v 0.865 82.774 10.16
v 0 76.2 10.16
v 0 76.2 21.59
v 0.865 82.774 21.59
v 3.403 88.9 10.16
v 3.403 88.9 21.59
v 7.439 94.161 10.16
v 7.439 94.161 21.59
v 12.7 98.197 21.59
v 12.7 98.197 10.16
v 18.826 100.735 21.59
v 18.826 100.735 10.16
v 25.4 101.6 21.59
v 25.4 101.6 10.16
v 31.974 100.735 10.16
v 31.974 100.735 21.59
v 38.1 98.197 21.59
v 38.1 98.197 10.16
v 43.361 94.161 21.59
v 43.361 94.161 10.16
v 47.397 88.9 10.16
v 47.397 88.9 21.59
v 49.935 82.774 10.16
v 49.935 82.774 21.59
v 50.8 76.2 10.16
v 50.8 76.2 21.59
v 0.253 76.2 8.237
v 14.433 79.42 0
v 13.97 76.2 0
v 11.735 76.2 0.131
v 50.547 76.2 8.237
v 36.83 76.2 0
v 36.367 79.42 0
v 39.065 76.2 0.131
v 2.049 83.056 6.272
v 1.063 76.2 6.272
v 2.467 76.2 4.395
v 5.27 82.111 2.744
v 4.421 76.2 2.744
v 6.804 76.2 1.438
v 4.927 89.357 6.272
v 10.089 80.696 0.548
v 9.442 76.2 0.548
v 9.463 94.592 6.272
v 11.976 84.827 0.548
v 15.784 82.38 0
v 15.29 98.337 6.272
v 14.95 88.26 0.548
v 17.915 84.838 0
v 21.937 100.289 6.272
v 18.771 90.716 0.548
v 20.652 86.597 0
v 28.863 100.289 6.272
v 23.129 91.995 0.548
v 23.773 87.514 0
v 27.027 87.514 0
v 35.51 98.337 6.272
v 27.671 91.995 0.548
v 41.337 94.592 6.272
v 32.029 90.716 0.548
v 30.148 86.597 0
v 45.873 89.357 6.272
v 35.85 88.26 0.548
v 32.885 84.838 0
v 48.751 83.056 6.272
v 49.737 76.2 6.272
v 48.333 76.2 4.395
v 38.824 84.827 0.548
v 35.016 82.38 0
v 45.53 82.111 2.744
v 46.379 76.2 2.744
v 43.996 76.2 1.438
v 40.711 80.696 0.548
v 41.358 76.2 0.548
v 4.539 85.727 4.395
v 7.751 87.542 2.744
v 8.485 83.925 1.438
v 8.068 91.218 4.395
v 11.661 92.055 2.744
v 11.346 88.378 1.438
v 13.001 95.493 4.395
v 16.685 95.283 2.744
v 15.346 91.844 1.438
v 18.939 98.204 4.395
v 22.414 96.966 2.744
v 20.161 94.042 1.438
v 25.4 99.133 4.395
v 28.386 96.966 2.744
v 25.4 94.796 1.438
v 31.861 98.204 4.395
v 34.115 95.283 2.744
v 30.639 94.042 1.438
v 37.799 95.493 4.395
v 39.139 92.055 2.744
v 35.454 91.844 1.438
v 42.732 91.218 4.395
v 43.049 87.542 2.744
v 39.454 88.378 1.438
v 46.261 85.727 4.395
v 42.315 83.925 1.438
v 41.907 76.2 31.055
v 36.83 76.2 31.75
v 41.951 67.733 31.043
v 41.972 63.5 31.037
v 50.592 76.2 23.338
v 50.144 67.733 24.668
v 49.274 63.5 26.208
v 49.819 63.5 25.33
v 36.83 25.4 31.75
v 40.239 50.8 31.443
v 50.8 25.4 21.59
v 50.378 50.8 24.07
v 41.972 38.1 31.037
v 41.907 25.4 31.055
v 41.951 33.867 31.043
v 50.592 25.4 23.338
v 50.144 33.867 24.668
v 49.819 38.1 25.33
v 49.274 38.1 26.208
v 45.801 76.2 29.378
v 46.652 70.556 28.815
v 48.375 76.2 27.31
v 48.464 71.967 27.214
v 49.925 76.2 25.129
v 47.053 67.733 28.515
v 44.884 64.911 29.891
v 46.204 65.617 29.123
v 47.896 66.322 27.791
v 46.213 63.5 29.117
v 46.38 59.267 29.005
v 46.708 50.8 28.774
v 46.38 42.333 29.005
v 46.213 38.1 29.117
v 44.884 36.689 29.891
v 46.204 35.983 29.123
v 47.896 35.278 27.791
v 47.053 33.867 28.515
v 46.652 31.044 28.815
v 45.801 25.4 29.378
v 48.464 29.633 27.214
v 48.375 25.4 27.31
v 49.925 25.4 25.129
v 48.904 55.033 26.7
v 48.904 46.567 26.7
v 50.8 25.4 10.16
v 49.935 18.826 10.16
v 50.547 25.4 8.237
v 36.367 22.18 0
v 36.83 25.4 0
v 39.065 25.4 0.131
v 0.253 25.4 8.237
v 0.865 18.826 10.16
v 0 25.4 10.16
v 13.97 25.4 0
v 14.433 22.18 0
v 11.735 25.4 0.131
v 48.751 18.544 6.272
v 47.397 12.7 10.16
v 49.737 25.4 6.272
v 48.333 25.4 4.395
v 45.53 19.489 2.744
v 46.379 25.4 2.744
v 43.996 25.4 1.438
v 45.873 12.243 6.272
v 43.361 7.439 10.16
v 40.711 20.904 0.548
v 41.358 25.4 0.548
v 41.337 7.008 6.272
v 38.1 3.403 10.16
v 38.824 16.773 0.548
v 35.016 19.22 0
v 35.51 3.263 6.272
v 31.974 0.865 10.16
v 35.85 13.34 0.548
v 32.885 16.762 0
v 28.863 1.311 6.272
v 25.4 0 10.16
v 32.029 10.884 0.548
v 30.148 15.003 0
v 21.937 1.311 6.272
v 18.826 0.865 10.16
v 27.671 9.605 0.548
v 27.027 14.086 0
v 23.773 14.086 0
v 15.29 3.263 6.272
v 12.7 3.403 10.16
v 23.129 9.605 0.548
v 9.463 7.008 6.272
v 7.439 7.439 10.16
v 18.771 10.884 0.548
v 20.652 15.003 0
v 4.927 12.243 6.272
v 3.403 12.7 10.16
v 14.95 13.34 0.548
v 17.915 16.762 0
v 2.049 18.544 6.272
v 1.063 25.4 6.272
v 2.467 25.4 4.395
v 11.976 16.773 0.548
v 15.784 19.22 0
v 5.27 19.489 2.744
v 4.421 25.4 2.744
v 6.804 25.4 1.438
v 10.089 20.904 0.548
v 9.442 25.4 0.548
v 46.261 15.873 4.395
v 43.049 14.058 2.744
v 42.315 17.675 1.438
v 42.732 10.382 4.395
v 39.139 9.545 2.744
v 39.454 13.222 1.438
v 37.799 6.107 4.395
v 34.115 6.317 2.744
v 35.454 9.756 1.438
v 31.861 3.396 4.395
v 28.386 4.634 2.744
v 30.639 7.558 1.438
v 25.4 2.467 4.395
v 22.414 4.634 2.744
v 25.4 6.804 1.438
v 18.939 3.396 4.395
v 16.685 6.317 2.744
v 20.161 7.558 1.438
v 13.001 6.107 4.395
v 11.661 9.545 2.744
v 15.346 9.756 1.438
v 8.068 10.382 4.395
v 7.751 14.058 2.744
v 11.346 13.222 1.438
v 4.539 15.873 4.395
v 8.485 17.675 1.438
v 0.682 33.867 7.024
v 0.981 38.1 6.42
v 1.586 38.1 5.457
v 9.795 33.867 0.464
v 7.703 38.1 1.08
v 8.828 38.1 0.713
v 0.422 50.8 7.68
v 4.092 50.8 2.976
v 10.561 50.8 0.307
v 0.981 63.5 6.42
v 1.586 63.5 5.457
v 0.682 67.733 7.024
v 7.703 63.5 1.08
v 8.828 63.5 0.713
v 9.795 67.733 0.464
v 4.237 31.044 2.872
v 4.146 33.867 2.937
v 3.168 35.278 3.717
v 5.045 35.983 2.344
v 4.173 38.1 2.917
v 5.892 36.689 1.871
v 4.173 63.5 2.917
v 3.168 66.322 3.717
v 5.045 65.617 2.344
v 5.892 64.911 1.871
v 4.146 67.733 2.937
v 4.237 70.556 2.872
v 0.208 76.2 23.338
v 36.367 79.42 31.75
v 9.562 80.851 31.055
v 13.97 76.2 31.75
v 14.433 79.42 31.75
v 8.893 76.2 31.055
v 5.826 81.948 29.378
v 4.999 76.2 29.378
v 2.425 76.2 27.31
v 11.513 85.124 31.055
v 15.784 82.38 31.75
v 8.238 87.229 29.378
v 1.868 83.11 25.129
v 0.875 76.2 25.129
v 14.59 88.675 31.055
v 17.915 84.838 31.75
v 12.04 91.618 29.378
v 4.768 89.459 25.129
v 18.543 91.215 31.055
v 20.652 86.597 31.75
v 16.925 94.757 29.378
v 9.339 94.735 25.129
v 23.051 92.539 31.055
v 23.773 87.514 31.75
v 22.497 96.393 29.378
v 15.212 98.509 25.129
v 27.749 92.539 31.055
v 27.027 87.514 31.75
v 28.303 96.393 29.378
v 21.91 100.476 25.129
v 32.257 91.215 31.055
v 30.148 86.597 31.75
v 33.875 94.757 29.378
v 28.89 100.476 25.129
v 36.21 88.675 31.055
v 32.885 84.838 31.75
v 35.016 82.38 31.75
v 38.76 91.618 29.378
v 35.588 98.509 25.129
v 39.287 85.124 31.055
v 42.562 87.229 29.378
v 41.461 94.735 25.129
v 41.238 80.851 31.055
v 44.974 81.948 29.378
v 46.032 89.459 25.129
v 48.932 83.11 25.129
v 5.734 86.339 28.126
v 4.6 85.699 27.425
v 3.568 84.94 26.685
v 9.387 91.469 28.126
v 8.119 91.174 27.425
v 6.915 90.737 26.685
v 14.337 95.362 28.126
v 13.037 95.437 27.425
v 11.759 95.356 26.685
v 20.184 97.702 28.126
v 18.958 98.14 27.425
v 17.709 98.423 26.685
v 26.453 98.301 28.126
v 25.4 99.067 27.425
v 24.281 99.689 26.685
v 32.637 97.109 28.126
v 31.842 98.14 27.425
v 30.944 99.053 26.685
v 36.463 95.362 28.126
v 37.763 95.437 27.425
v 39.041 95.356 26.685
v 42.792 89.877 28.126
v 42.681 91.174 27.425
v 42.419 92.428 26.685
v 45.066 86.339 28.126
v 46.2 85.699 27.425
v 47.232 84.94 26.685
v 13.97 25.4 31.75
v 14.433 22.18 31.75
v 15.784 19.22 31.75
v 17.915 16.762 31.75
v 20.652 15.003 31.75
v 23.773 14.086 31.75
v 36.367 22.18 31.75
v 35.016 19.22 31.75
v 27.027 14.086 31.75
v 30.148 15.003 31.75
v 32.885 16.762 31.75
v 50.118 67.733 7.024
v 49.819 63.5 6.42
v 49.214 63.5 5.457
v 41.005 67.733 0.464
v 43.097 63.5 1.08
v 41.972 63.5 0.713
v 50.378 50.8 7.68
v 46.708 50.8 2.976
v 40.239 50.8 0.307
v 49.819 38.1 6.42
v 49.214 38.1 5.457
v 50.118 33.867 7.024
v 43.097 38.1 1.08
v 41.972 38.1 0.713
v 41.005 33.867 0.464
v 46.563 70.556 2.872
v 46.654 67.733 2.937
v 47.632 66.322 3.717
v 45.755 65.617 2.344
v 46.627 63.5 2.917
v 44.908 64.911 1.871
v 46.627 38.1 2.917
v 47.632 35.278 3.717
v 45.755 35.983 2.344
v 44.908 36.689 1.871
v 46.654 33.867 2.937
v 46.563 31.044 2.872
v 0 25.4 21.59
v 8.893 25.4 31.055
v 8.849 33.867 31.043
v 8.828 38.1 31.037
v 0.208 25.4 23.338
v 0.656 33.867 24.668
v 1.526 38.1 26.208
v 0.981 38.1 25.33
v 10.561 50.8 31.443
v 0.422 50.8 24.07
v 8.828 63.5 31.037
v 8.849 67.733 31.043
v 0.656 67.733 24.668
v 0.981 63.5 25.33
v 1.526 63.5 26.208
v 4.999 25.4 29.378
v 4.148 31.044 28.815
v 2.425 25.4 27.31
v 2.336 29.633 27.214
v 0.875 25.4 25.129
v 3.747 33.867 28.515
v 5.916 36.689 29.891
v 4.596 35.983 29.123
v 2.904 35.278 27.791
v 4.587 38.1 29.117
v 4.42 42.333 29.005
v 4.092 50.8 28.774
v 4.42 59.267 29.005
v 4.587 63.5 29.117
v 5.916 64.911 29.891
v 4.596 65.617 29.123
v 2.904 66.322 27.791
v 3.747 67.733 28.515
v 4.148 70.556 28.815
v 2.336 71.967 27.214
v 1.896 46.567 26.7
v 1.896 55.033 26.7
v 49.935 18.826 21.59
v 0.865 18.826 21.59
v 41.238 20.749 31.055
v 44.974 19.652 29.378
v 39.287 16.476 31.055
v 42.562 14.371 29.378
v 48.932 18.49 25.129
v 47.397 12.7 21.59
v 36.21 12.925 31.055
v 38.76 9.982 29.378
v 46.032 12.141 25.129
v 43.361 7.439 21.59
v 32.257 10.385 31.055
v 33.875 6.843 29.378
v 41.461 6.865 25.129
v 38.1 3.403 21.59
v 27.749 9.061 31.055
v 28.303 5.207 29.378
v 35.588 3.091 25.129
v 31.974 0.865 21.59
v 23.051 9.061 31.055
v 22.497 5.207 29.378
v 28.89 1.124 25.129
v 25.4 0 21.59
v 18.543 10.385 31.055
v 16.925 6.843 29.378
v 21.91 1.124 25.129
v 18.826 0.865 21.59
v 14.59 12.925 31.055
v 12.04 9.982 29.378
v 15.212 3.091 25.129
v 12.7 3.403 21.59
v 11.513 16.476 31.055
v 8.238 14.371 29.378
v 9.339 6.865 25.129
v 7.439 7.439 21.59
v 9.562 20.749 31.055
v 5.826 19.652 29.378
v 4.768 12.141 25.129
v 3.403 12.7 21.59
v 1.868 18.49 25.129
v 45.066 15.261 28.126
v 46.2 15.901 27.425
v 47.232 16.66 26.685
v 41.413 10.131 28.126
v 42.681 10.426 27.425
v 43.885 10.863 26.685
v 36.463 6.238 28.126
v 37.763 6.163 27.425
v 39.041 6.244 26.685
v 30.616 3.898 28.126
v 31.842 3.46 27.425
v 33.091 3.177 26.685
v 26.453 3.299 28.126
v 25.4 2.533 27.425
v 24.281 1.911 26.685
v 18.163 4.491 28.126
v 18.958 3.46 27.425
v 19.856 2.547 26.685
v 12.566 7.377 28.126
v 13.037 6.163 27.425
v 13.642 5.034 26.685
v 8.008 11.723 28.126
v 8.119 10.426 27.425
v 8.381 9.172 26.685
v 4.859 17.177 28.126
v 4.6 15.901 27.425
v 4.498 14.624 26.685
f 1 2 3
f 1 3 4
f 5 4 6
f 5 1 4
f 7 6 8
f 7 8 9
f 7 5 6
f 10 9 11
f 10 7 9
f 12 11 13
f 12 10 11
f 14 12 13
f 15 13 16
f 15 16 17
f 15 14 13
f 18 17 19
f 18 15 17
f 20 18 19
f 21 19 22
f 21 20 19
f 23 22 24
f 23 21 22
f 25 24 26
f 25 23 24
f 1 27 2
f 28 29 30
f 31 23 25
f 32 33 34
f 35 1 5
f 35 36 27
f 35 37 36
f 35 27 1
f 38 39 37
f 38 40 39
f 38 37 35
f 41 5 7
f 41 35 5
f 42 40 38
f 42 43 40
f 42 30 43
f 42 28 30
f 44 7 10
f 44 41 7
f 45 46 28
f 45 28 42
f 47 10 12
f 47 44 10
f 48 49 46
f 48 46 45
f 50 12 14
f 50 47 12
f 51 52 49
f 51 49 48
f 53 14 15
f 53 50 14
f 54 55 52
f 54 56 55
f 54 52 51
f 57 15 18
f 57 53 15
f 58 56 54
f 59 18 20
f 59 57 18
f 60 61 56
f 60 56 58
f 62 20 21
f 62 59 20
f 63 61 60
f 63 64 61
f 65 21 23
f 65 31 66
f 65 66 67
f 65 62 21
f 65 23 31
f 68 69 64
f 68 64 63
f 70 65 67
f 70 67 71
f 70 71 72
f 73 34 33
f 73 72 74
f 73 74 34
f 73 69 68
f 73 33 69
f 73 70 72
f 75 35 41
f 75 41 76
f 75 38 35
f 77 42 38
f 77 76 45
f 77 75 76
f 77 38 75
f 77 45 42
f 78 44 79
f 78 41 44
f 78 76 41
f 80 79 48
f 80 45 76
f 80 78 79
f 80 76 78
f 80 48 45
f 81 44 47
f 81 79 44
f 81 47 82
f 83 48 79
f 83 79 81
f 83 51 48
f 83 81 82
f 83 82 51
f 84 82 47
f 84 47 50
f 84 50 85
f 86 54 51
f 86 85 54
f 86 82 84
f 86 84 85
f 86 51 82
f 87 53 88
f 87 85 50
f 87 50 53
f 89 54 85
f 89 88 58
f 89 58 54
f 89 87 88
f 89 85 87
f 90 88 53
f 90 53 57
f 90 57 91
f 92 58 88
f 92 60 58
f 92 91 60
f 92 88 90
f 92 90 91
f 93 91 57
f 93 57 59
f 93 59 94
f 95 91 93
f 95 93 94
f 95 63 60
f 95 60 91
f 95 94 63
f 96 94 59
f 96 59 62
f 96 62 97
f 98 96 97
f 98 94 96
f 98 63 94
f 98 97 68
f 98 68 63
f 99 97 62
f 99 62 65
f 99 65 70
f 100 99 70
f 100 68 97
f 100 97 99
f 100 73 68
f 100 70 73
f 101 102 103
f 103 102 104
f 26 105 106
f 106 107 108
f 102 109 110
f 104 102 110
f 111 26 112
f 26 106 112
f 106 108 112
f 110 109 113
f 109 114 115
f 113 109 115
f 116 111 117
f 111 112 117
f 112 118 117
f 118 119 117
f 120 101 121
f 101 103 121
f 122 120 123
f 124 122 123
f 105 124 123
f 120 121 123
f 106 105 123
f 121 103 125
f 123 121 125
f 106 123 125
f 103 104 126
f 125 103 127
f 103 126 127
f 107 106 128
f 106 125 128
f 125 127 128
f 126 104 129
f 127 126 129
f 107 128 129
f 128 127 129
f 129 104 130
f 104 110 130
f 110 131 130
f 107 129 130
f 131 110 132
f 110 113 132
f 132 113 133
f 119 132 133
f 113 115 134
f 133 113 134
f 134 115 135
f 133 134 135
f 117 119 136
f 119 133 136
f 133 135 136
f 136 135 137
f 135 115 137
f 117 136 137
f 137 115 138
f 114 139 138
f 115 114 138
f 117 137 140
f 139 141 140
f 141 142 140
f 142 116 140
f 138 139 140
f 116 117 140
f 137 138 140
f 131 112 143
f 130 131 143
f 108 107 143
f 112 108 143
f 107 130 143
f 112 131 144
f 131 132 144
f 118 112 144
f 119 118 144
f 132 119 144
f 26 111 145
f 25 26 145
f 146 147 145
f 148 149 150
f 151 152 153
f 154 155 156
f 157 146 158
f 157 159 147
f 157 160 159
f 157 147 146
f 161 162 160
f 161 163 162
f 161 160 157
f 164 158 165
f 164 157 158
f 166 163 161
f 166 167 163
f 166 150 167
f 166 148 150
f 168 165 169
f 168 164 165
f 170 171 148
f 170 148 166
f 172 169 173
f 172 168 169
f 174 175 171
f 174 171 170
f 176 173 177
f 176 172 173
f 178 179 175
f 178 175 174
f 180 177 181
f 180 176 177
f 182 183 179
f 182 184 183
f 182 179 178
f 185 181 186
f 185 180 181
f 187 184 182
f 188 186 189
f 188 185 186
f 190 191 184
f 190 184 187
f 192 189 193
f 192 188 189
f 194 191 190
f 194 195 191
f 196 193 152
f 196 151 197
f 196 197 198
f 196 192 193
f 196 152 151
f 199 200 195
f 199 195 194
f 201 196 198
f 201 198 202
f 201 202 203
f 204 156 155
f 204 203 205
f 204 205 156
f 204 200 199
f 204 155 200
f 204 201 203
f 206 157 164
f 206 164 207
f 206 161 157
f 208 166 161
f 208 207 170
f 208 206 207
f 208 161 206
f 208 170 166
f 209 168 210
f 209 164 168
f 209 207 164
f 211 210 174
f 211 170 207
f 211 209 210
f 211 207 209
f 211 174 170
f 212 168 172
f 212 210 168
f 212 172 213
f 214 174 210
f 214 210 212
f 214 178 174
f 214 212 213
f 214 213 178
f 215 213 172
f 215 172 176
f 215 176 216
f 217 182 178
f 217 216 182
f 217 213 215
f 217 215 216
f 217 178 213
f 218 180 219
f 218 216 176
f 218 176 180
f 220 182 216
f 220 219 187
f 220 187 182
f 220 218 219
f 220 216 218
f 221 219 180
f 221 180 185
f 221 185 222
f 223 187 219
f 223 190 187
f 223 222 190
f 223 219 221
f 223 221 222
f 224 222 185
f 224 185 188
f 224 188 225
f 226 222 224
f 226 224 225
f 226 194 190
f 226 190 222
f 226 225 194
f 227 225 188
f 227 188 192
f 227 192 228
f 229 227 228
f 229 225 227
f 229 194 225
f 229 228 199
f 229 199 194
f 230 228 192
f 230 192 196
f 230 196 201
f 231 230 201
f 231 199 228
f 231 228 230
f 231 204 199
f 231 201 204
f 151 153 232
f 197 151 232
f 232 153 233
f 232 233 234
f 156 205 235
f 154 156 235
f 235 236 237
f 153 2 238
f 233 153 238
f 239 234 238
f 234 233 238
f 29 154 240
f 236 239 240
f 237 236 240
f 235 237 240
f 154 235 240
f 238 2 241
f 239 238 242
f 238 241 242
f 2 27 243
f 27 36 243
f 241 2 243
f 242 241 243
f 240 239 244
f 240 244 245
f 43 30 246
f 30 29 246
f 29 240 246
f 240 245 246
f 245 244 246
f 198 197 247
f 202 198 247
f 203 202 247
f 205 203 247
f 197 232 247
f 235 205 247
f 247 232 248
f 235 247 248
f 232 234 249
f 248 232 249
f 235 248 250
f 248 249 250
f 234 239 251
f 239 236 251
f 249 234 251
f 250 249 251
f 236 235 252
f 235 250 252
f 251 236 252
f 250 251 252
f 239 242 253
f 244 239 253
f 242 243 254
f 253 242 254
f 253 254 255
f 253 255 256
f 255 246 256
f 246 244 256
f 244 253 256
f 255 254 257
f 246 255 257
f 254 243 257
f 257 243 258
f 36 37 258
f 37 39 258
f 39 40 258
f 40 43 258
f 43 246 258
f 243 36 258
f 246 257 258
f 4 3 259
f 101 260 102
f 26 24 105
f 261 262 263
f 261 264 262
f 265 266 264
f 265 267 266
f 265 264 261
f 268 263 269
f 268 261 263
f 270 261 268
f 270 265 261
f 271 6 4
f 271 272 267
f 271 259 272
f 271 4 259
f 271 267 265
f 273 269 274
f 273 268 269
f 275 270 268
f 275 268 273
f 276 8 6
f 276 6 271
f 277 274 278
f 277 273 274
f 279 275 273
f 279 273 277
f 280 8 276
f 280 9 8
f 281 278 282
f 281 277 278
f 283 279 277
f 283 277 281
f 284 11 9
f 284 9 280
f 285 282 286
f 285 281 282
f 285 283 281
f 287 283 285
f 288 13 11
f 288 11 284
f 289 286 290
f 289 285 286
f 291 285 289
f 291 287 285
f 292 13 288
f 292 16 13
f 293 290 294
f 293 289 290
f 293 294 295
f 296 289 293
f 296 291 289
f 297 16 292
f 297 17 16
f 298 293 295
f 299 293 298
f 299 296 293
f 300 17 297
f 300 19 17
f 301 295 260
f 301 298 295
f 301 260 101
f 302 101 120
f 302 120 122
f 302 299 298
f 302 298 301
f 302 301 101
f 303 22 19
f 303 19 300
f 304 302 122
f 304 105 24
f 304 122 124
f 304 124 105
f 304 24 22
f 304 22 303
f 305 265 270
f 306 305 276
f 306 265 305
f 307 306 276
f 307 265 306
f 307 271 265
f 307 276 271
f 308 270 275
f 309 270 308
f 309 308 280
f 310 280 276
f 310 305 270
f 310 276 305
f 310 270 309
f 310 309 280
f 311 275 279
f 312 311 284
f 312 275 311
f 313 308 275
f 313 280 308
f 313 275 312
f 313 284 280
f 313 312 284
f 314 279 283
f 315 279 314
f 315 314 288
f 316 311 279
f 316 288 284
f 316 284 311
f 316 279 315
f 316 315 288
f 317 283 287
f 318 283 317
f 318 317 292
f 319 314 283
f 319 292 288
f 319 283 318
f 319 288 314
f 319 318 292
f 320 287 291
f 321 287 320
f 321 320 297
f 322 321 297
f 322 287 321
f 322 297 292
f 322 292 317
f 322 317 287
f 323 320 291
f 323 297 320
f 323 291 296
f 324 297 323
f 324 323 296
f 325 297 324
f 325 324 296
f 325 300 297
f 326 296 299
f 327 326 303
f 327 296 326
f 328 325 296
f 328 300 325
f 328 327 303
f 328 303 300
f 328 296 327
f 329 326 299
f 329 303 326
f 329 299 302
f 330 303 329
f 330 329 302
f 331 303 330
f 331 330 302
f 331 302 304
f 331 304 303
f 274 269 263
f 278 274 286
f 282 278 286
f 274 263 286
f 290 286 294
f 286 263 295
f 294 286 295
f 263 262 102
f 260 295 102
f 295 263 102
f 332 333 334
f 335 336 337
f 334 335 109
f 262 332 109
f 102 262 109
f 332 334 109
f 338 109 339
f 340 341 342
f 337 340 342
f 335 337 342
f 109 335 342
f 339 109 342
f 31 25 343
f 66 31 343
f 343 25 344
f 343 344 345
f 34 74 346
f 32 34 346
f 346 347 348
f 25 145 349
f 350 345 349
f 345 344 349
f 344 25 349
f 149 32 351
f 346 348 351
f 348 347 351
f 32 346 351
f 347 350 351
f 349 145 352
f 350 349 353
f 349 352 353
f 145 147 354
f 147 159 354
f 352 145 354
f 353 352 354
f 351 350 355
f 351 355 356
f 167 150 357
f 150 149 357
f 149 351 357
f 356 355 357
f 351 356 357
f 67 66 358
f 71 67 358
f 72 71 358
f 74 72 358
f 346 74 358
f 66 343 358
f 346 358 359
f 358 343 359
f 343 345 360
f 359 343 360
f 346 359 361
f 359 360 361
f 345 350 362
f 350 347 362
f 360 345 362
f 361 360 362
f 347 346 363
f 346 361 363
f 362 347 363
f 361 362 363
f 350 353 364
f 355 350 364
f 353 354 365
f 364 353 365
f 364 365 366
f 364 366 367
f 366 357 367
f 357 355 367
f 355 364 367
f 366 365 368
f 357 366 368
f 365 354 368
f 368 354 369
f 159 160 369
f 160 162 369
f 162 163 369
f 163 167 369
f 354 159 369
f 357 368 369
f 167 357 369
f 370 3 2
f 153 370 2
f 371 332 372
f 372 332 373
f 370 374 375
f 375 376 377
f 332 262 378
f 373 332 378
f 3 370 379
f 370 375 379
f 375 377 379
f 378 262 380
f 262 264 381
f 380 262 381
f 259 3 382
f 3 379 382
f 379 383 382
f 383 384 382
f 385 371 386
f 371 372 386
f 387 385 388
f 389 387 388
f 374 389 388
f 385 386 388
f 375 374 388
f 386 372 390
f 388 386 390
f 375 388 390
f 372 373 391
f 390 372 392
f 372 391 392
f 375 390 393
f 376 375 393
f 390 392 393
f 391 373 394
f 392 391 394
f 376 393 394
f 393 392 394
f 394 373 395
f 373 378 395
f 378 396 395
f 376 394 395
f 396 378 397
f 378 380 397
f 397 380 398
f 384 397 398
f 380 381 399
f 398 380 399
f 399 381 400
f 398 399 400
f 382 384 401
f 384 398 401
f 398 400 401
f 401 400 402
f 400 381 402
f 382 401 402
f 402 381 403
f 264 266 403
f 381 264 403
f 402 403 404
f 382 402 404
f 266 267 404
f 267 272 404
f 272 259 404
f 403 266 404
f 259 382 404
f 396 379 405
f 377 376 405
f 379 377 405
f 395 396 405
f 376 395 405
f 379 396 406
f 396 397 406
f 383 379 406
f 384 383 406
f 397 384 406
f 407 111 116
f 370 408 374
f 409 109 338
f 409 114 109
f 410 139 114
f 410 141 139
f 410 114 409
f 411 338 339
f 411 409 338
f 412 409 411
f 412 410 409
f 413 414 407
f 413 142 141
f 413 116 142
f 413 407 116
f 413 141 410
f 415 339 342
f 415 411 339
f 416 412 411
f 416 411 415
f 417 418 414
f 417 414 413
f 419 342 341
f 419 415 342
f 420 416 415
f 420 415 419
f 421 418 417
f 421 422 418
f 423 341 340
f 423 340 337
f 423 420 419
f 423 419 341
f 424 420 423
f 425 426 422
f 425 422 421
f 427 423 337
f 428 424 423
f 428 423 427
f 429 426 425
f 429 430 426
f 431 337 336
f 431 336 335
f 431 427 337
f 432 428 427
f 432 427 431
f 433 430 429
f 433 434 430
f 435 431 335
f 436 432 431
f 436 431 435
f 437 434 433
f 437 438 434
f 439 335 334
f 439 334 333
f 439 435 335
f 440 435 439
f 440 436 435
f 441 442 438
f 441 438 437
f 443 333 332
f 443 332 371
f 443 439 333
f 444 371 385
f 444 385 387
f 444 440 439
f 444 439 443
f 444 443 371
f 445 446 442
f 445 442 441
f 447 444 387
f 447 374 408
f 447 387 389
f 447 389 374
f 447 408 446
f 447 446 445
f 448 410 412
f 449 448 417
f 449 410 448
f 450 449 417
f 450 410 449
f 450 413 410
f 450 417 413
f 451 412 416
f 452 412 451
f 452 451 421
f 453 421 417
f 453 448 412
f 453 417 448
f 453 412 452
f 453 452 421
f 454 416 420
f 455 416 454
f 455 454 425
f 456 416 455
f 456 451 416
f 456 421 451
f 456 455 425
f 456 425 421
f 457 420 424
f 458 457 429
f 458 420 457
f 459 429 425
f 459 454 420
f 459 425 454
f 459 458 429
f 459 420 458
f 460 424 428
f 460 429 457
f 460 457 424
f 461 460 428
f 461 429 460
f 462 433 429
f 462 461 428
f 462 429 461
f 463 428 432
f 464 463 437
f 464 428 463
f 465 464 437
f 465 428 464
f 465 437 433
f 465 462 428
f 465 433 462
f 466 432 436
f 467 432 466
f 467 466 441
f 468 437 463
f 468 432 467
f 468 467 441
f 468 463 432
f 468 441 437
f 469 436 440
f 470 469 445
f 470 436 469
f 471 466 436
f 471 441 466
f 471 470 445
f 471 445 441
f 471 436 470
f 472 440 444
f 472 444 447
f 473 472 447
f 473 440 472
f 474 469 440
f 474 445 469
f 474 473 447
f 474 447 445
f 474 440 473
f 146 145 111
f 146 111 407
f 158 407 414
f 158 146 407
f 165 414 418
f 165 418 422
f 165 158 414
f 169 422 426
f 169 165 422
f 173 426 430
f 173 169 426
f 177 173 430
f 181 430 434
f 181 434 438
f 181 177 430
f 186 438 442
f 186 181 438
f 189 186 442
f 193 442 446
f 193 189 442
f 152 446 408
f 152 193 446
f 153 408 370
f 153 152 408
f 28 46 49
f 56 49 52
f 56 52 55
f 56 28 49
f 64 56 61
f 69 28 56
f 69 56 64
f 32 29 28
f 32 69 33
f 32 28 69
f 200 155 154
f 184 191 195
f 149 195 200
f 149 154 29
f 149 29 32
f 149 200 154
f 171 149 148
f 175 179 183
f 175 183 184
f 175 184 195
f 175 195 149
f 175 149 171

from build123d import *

# Parameters (mm, degrees)
F0_W     = 50.8
F0_H     = 31.75
F1_DEPTH = 101.6


# Not quite as in the source:
# - a feature names something its author has since deleted; it is built from what else it names
# - the program builds the solid bodies; features that only make, move or delete a surface that nothing else refers to are left out


with BuildPart() as f1:
    # F0 (on Front) → F1 (new body)
    with BuildSketch(Plane.XZ):
        with Locations((25.4, 15.875)):
            Rectangle(F0_W, F0_H)
    extrude(amount=-F1_DEPTH)

    # F5: sweep along a path in F2
    with BuildLine(Plane.XY.offset(31.75)) as f5_path:
        Line((50.8, 76.2), (50.8, 25.4))
        ThreePointArc((50.8, 25.4), (25.4, 0), (0, 25.4))
        Line((0, 25.4), (0, 76.2))
        ThreePointArc((0, 76.2), (25.4, 101.6), (50.8, 76.2))
    # F4 (on plane+point) → F5 (sweep, cut)
    with BuildSketch(Plane.XZ.offset(-25.4)):
        with BuildLine():
            Line((50.8, 21.59), (50.8, 31.75))
            Line((50.8, 31.75), (36.83, 31.75))
            add(Edge.make_bspline(
                [(50.8, 21.59), (50.8, 31.75), (36.83, 31.75)],
                knots=[0, 0, 0, 1.5707963268, 1.5707963268, 1.5707963268], degree=2, weights=[1, 0.7071067812, 1]))
        make_face()
        with BuildLine():
            Line((50.8, 0), (50.8, 10.16))
            add(Edge.make_bspline(
                [(36.83, 0), (50.8, 0), (50.8, 10.16)],
                knots=[4.7123889804, 4.7123889804, 4.7123889804, 6.2831853072, 6.2831853072, 6.2831853072], degree=2, weights=[1, 0.7071067812, 1]))
            Line((36.83, 0), (50.8, 0))
        make_face()
        Polygon((36.83, 31.75), (50.8, 31.75), (50.8, 21.59), (50.8, 10.16), (50.8, 0), (36.83, 0), (36.83, -19.05), (76.2, -19.05), (76.2, 10.16), (76.2, 21.59), (76.2, 50.8), (36.83, 50.8), align=None)
    sweep(path=f5_path.line, mode=Mode.SUBTRACT)


solid = f1.part
